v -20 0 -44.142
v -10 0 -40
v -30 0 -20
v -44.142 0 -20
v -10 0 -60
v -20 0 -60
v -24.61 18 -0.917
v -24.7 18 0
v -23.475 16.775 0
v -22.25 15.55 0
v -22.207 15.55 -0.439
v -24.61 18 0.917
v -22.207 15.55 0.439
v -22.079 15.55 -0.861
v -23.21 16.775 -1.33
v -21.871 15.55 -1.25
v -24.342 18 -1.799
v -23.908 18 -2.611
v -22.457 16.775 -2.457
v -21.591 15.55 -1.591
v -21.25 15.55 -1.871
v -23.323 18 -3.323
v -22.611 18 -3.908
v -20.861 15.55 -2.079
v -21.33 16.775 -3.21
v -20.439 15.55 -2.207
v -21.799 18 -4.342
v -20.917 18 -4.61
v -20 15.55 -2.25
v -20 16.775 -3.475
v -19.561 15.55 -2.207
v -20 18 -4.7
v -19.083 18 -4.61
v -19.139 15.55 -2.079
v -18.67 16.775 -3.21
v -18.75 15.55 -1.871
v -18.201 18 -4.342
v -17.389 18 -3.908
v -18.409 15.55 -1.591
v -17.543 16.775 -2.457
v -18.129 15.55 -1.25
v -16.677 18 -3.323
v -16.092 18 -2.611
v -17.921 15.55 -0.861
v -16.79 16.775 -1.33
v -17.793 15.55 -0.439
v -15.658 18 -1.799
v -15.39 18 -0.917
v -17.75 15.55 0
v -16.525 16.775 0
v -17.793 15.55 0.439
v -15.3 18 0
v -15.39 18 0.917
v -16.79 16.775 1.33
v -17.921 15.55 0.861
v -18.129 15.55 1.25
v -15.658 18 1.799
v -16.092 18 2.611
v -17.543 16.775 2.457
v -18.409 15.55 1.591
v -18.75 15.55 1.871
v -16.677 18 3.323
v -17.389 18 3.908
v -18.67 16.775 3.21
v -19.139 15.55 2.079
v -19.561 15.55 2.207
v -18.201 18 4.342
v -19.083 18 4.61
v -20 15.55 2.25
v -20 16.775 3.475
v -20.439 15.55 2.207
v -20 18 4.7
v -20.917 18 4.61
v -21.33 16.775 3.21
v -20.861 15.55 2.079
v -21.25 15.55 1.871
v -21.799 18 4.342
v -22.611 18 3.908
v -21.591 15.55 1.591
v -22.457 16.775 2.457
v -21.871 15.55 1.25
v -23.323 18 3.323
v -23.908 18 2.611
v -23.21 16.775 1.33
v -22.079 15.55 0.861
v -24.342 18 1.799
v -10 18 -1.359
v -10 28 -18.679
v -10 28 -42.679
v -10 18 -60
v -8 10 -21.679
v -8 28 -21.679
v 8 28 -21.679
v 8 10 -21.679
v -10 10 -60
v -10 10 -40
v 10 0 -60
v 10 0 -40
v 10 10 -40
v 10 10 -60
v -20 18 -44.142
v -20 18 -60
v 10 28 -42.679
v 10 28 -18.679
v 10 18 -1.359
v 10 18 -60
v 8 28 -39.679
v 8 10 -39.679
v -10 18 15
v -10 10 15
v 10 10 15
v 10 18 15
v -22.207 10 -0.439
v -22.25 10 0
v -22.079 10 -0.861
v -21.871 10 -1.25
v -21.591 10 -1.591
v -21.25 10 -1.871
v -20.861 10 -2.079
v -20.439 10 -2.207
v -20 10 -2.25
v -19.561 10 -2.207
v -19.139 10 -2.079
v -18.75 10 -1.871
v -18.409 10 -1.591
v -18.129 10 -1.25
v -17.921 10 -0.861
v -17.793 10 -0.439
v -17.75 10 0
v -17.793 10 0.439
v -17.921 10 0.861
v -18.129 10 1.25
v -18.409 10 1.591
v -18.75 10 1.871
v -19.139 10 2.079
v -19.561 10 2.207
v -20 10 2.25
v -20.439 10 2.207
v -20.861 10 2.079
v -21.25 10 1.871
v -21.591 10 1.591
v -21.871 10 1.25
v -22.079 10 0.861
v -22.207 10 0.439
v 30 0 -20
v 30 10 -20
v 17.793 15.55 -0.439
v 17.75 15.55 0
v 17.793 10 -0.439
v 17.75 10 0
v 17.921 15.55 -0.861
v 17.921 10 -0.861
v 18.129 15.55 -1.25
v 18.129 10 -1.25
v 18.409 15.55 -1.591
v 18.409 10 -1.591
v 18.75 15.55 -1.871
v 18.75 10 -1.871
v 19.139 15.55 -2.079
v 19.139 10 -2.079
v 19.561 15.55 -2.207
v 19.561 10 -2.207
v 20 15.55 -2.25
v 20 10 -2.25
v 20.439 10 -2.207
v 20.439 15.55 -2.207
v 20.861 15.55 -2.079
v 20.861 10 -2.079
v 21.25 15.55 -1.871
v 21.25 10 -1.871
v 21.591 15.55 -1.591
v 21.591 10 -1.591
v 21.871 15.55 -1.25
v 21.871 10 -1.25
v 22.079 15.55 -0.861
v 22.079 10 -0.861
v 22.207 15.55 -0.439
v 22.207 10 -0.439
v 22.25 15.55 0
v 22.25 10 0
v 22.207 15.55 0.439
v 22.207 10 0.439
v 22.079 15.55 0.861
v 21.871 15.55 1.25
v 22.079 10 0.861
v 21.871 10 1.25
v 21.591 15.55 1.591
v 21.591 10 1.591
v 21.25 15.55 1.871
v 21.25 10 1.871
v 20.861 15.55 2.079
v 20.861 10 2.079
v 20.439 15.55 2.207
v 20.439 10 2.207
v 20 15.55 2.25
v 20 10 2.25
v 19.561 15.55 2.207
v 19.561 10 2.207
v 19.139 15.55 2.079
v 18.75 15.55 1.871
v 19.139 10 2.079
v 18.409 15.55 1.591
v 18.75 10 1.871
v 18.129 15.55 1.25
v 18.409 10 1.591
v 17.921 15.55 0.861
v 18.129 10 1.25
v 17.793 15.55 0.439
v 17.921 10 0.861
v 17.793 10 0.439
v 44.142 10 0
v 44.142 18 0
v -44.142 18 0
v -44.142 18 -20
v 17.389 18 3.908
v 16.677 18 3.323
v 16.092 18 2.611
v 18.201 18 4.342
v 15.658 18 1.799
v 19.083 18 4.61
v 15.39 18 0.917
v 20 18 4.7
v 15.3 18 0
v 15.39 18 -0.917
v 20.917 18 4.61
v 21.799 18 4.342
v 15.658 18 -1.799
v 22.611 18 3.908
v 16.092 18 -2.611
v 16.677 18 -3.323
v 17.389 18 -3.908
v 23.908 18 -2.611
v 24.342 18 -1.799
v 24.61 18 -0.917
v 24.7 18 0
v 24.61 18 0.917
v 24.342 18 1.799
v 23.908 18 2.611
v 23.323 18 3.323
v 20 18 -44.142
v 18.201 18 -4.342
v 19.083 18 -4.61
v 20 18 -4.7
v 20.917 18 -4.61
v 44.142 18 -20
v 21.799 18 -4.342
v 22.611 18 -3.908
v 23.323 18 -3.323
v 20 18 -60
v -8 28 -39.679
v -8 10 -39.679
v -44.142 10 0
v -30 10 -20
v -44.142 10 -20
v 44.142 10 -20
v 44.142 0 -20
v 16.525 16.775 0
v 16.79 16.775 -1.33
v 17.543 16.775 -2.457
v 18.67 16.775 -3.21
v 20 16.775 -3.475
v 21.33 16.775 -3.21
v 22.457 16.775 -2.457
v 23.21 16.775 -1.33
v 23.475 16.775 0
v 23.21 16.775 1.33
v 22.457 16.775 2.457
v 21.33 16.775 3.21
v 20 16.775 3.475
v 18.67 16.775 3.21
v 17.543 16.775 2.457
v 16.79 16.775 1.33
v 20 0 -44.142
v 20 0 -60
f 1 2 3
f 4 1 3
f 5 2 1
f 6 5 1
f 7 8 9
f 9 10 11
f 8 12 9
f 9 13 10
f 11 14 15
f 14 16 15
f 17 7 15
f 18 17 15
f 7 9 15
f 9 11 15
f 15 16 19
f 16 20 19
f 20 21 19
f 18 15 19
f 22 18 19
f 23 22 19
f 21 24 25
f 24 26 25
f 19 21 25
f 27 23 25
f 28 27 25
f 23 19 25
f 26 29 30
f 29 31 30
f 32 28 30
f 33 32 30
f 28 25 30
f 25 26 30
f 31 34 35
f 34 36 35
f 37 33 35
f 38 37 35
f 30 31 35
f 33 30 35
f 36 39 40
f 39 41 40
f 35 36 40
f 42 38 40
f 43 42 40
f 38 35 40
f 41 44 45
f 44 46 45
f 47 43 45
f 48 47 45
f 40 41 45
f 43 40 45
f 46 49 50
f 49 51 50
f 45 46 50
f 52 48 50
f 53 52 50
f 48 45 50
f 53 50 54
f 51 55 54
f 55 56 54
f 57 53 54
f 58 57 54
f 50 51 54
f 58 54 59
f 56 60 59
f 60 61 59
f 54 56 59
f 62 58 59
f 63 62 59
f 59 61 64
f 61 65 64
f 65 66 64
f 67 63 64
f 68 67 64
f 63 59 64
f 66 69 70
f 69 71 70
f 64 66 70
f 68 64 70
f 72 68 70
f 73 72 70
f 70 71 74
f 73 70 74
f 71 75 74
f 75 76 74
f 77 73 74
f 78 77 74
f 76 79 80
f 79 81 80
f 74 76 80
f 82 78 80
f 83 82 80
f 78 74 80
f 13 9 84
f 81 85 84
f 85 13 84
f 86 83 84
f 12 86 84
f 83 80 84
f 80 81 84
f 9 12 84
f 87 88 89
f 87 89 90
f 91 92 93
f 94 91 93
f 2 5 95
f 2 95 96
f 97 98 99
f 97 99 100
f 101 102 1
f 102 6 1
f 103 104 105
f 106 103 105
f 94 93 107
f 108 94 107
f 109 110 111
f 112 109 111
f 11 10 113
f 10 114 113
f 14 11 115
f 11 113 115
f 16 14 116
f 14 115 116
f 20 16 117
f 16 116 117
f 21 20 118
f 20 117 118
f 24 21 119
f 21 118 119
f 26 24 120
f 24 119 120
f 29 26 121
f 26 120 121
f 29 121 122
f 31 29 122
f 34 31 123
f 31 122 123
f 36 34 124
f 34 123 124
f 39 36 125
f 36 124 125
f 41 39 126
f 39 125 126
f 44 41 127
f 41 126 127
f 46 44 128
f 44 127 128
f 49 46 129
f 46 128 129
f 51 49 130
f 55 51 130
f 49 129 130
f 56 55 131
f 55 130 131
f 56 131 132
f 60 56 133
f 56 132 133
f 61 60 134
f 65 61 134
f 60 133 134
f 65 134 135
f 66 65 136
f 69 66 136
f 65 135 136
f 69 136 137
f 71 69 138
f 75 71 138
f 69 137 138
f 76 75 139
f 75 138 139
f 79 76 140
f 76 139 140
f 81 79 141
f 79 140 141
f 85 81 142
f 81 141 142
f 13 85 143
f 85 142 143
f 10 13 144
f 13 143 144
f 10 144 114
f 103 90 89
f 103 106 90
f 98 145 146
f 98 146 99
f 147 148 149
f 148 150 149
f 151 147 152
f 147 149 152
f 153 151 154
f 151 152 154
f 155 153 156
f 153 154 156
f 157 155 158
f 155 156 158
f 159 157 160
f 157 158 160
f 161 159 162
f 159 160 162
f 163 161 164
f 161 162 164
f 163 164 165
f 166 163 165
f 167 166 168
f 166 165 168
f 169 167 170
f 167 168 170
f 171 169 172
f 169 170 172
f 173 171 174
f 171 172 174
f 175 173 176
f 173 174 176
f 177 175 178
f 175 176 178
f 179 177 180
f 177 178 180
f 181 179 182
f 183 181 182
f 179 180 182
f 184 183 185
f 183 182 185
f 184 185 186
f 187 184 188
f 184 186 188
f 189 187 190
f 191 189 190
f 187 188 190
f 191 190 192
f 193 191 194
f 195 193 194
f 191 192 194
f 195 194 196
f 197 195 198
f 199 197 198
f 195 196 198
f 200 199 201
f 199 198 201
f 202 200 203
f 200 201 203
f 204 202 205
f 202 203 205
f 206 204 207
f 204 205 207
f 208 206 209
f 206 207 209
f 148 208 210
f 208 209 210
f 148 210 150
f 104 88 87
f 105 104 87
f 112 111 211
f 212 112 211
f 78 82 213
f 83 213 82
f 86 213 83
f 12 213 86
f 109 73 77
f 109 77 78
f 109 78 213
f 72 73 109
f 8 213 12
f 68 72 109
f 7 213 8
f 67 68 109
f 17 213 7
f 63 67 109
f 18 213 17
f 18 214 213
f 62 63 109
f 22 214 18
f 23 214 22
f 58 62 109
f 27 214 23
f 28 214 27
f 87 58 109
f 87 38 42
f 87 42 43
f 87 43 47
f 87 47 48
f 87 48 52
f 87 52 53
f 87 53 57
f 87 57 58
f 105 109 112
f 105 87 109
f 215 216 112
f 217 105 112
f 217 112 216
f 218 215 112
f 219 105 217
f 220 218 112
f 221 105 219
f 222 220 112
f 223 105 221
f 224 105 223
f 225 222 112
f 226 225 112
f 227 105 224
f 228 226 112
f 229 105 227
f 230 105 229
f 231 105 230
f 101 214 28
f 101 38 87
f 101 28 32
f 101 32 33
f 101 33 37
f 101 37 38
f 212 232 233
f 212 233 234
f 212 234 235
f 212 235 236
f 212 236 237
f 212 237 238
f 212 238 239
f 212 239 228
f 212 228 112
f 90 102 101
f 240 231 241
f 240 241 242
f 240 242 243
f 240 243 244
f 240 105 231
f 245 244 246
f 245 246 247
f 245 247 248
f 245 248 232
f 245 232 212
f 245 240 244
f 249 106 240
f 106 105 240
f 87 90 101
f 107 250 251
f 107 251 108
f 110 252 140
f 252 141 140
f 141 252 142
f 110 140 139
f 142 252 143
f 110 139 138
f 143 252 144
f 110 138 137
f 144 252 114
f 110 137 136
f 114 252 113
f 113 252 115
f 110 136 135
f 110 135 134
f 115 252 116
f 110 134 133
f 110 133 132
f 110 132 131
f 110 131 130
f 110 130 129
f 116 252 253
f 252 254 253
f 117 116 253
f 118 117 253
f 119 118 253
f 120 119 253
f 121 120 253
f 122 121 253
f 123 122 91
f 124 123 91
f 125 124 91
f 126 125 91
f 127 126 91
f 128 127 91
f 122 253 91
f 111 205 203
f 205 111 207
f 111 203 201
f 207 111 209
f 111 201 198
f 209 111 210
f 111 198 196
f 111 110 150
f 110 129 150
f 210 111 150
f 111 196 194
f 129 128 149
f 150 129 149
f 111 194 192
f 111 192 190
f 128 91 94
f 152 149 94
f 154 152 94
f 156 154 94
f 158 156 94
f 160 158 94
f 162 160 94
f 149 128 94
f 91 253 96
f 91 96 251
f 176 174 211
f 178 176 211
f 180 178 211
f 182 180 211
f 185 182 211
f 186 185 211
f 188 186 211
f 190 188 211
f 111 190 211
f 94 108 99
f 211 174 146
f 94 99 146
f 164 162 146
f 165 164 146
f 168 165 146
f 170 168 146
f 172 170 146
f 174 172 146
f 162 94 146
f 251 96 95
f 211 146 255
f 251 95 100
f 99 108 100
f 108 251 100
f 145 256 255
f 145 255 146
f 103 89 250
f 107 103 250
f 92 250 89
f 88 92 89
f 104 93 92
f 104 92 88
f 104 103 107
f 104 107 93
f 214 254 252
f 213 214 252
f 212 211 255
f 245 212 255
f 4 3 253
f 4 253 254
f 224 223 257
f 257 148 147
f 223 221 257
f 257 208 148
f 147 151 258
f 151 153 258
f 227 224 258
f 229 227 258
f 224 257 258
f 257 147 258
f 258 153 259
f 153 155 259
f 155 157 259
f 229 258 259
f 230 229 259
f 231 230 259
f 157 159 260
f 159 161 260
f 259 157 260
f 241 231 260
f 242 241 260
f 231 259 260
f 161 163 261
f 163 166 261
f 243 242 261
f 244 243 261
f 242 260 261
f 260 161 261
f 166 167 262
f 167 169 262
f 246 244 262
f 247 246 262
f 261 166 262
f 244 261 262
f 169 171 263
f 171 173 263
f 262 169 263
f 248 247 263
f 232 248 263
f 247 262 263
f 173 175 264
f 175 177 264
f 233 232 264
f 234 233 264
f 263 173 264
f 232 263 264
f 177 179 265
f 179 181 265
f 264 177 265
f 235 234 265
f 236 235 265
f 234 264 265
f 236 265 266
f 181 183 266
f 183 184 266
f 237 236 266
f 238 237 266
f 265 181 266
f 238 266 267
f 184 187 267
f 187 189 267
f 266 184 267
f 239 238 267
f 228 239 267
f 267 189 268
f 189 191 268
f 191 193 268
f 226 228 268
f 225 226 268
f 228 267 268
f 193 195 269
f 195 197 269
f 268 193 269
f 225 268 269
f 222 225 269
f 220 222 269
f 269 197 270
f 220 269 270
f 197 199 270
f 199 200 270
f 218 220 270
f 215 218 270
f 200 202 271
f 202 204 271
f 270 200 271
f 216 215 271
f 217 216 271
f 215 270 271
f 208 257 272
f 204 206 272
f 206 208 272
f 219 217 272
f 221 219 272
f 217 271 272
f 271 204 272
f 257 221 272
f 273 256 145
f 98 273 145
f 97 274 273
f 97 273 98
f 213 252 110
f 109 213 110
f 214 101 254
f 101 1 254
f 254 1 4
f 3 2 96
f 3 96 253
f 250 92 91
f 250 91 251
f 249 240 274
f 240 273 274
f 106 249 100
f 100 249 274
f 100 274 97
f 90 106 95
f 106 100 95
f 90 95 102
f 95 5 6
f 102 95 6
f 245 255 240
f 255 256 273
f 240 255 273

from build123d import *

# Parameters (mm, degrees)
EXTRUDE_1_DEPTH             = 10
EXTRUDE_1_2_DEPTH           = 10
EXTRUDE_2_DEPTH             = 8
HOLE_WIZARD_M41_D           = 4.5
HOLE_WIZARD_M41_CSINK_D     = 9.4
HOLE_WIZARD_M41_CSINK_ANGLE = 90
EXTRUDE_3_DEPTH             = 10
SKETCH_8_W                  = 16
SKETCH_8_H                  = 18
CUT_EXTRUDE_1_DEPTH         = 20


with BuildPart() as part:
    # Эскиз1 → Бобышка-Вытянуть1 (new body)
    with BuildSketch(Plane(origin=(0, 0, 0), x_dir=(1, 0, 0), z_dir=(0, 1, 0))):
        Polygon((-30, 20), (-44.142135624, 20), (-20, 44.142135624), (-20, 60), (-10, 60), (-10, 40), align=None)
    extrude(amount=EXTRUDE_1_DEPTH)



with BuildPart() as body_2:
    # Эскиз1 → Extrude 1 2 (new body)
    with BuildSketch(Plane(origin=(0, 0, 0), x_dir=(1, 0, 0), z_dir=(0, 1, 0))):
        Polygon((30, 20), (10, 40), (10, 60), (20, 60), (20, 44.142135624), (44.142135624, 20), align=None)
    extrude(amount=EXTRUDE_1_2_DEPTH)


with BuildPart() as part_1:
    add(part.part)

    add(body_2.part)  # Бобышка-Вытянуть2 merges body 2
    # Эскиз2 → Бобышка-Вытянуть2 (add)
    with BuildSketch(Plane(origin=(0, 10, 0), x_dir=(1, 0, 0), z_dir=(0, 1, 0))):
        Polygon((44.142135624, 20), (20, 44.142135624), (20, 60), (10, 60), (-10, 60), (-20, 60), (-20, 44.142135624), (-44.142135624, 20), (-44.142135624, 0), (-10, -15), (10, -15), (44.142135624, 0), align=None)
    extrude(amount=EXTRUDE_2_DEPTH)

    # Зенковка для винта с полупотайной головкой M41 (through all)
    with Locations(Plane(origin=(0, 18, 0), x_dir=(1, 0, 0), z_dir=(0, 1, 0))):
        with Locations((-20, 0), (20, 0)):
            CounterSinkHole(HOLE_WIZARD_M41_D / 2, HOLE_WIZARD_M41_CSINK_D / 2, counter_sink_angle=HOLE_WIZARD_M41_CSINK_ANGLE)

    # Эскиз7 → Бобышка-Вытянуть3 (add, symmetric)
    with BuildSketch(Plane(origin=(0, 0, 0), x_dir=(0, 0, -1), z_dir=(1, 0, 0))):
        Polygon((44.142135624, 18), (60, 18), (42.679491924, 28), (18.679491924, 28), (1.358983849, 18), align=None)
    extrude(amount=EXTRUDE_3_DEPTH, both=True)

    # Эскиз8 → Вырез-Вытянуть1 (cut)
    with BuildSketch(Plane(origin=(0, 28, 0), x_dir=(1, 0, 0), z_dir=(0, 1, 0))):
        with Locations((0, 30.679491924)):
            Rectangle(SKETCH_8_W, SKETCH_8_H)
    extrude(amount=-CUT_EXTRUDE_1_DEPTH, mode=Mode.SUBTRACT)


solid = part_1.part
